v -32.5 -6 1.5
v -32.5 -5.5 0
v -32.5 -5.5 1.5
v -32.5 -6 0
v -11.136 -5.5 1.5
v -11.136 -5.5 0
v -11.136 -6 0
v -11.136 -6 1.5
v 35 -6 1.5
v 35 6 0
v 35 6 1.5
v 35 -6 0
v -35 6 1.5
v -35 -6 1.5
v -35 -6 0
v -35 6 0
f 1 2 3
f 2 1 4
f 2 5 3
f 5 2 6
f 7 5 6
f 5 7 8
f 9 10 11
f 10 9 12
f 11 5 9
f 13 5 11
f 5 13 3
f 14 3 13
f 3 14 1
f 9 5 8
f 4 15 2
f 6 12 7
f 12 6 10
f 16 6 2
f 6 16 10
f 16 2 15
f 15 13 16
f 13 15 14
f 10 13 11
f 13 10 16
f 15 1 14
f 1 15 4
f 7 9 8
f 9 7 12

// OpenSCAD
// 10-well agarose gel comb, printed lying flat
// Units: mm. Plate thickness (Z) = 1.5 mm.

$fn = 64;

// ---- Dimensions ----
plate_t      = 1.5;     // plate thickness (Z)
spine_len    = 70;      // spine length (X)
spine_wid    = 12;      // spine width (Y)
tooth_count  = 10;      // number of teeth
tooth_w      = 5.0;     // tooth width (X)
tooth_l      = 12;      // tooth length (Y)
tooth_gap    = 1.5;     // gap between teeth (X)
eps          = 0.5;     // cutter overshoot past faces

// Check: 10*5.0 + 9*1.5 = 73.5 mm > spine_len (70 mm)
// The row does not fit centred with the given gap.
// Reduce the gap so the row is centred and has no overlap.
pitch = (spine_len - tooth_count * tooth_w) / (tooth_count + 1); // 5.0 mm
// With this pitch the outer teeth overhang the spine by 2.5 mm.
// Keep the pitch for a centred, symmetric row.

// ---- Model ----
difference() {
    // Base plate: spine + teeth
    translate([-spine_len/2, -spine_wid/2, 0])
        cube([spine_len, spine_wid, plate_t]);

    // Teeth cut out from the +Y side, extending past the top face
    for (i = [0 : tooth_count - 1]) {
        x = -spine_len/2 + i * pitch + tooth_w/2;
        translate([x, -spine_wid/2 - tooth_l, -eps])
            cube([tooth_w, tooth_l + eps, plate_t + 2*eps]);
    }
}
